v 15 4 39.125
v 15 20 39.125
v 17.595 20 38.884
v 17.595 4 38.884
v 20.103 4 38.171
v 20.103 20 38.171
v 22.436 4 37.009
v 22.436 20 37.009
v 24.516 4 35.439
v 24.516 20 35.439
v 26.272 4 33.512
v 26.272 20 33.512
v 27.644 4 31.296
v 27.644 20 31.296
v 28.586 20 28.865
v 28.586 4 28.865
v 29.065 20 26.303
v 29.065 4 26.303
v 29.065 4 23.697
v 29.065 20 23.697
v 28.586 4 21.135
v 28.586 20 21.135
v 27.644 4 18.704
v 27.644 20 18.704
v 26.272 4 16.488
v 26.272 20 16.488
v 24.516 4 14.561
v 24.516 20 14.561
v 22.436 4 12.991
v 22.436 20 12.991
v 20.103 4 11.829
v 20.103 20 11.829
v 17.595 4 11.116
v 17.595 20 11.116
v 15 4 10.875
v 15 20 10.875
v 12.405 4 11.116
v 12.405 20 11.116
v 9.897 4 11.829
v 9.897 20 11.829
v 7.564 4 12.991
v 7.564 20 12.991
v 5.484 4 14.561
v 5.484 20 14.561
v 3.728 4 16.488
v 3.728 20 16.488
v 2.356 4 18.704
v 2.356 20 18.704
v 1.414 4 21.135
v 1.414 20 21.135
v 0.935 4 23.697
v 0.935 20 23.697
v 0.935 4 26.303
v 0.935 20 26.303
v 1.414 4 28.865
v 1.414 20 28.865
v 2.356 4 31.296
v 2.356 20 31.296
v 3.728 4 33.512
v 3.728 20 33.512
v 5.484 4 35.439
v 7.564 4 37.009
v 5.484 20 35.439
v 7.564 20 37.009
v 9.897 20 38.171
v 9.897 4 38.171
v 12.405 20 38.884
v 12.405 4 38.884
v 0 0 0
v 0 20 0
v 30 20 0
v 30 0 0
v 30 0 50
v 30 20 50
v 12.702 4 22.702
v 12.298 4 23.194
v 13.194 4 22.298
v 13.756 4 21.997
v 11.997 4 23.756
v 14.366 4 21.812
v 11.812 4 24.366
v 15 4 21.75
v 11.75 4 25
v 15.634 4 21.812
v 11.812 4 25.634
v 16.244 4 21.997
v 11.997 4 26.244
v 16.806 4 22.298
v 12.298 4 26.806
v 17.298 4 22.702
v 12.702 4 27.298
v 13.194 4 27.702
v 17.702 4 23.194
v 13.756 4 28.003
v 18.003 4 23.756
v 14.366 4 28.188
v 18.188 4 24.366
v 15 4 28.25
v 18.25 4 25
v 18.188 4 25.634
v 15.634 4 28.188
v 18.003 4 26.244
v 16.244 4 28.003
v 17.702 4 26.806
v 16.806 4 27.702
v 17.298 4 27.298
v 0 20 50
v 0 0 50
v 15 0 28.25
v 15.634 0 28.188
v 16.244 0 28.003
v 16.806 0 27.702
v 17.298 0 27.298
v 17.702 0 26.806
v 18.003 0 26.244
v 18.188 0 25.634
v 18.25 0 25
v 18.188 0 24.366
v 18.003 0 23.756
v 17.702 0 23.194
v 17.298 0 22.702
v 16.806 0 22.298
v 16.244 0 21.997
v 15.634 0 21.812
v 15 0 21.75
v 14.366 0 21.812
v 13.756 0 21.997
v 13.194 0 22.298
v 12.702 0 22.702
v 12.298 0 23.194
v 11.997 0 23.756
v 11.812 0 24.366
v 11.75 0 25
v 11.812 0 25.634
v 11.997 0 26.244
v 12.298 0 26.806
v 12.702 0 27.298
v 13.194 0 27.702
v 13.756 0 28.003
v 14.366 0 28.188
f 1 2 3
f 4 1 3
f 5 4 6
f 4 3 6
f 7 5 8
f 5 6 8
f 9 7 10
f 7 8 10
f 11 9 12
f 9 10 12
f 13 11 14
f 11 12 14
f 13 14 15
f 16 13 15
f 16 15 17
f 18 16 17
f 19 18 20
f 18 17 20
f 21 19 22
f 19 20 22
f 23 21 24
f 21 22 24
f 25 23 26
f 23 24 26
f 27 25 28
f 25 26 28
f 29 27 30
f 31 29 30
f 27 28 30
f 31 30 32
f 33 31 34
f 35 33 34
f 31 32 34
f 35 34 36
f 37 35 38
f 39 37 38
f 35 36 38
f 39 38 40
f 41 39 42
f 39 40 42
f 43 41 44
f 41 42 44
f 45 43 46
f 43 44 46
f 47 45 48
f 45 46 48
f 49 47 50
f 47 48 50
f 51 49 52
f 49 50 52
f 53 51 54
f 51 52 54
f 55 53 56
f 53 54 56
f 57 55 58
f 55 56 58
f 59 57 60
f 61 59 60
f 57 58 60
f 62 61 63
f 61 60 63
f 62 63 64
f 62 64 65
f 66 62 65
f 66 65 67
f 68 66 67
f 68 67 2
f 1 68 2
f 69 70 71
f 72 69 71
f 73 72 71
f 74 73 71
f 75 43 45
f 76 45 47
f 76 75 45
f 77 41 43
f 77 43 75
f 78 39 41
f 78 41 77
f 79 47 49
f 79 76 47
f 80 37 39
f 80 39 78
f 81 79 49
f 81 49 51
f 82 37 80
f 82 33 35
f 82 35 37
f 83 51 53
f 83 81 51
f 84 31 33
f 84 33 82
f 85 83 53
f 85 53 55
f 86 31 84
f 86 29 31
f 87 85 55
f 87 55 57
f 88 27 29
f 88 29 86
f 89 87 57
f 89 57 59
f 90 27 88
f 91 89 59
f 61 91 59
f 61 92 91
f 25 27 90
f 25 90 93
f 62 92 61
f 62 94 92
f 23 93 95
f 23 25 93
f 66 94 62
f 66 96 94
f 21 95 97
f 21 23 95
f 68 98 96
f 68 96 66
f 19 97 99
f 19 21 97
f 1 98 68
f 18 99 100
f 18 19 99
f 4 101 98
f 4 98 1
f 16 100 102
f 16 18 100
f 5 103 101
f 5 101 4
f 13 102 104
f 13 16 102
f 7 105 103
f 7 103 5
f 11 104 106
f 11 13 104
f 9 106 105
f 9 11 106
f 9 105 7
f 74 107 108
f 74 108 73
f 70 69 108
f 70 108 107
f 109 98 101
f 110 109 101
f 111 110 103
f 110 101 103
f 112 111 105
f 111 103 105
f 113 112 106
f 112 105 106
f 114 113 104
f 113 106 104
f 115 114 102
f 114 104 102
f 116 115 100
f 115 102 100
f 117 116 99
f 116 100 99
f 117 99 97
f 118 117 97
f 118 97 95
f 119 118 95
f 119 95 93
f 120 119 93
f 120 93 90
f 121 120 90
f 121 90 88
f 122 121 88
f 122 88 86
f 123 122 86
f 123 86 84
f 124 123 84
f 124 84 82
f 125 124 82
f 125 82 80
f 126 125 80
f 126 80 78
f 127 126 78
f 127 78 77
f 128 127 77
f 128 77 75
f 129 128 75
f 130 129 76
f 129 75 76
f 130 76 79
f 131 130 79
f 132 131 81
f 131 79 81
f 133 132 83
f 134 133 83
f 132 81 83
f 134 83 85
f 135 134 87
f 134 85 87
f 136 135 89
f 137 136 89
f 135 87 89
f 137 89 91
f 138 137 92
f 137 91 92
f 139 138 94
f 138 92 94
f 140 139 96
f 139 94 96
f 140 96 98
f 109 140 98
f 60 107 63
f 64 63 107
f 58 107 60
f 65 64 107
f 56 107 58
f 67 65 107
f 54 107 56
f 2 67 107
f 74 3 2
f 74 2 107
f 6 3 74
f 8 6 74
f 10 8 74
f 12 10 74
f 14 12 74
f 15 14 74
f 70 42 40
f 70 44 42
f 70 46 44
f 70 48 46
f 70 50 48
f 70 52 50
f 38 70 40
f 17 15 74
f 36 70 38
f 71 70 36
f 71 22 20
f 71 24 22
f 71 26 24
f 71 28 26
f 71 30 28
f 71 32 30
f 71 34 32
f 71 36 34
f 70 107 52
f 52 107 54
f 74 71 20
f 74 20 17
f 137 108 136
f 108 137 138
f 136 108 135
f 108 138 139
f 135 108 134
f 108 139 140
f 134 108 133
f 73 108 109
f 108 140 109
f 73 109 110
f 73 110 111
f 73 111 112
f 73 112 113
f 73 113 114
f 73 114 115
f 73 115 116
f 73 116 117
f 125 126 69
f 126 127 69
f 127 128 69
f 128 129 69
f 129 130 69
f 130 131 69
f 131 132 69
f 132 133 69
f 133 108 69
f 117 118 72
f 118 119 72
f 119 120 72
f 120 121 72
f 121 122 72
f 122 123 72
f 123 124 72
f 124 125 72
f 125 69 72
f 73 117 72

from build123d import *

# Parameters (mm, degrees)
SKETCH2_W           = 30
SKETCH2_H           = 20
BOSS_EXTRUDE1_DEPTH = 50
SKETCH3_R           = 14.125
CUT_EXTRUDE1_DEPTH  = 16
SKETCH4_R           = 3.25
CUT_EXTRUDE2_DEPTH  = 16


with BuildPart() as part:
    # Sketch2 → Boss-Extrude1 (new body)
    with BuildSketch(Plane.XY):
        with Locations((15, 10)):
            Rectangle(SKETCH2_W, SKETCH2_H)
    extrude(amount=BOSS_EXTRUDE1_DEPTH)

    # Sketch3 → Cut-Extrude1 (cut)
    with BuildSketch(Plane(origin=(0, 20, 0), x_dir=(1, 0, 0), z_dir=(0, 1, 0))):
        with Locations(Location((15, -25, 0), (0, 0, 270))):
            Circle(SKETCH3_R)
    extrude(amount=-CUT_EXTRUDE1_DEPTH, mode=Mode.SUBTRACT)

    # Sketch4 → Cut-Extrude2 (cut)
    with BuildSketch(Plane(origin=(0, 4, 0), x_dir=(1, 0, 0), z_dir=(0, 1, 0))):
        with Locations(Location((15, -25, 0), (0, 0, 270))):
            Circle(SKETCH4_R)
    extrude(amount=-CUT_EXTRUDE2_DEPTH, mode=Mode.SUBTRACT)


solid = part.part
